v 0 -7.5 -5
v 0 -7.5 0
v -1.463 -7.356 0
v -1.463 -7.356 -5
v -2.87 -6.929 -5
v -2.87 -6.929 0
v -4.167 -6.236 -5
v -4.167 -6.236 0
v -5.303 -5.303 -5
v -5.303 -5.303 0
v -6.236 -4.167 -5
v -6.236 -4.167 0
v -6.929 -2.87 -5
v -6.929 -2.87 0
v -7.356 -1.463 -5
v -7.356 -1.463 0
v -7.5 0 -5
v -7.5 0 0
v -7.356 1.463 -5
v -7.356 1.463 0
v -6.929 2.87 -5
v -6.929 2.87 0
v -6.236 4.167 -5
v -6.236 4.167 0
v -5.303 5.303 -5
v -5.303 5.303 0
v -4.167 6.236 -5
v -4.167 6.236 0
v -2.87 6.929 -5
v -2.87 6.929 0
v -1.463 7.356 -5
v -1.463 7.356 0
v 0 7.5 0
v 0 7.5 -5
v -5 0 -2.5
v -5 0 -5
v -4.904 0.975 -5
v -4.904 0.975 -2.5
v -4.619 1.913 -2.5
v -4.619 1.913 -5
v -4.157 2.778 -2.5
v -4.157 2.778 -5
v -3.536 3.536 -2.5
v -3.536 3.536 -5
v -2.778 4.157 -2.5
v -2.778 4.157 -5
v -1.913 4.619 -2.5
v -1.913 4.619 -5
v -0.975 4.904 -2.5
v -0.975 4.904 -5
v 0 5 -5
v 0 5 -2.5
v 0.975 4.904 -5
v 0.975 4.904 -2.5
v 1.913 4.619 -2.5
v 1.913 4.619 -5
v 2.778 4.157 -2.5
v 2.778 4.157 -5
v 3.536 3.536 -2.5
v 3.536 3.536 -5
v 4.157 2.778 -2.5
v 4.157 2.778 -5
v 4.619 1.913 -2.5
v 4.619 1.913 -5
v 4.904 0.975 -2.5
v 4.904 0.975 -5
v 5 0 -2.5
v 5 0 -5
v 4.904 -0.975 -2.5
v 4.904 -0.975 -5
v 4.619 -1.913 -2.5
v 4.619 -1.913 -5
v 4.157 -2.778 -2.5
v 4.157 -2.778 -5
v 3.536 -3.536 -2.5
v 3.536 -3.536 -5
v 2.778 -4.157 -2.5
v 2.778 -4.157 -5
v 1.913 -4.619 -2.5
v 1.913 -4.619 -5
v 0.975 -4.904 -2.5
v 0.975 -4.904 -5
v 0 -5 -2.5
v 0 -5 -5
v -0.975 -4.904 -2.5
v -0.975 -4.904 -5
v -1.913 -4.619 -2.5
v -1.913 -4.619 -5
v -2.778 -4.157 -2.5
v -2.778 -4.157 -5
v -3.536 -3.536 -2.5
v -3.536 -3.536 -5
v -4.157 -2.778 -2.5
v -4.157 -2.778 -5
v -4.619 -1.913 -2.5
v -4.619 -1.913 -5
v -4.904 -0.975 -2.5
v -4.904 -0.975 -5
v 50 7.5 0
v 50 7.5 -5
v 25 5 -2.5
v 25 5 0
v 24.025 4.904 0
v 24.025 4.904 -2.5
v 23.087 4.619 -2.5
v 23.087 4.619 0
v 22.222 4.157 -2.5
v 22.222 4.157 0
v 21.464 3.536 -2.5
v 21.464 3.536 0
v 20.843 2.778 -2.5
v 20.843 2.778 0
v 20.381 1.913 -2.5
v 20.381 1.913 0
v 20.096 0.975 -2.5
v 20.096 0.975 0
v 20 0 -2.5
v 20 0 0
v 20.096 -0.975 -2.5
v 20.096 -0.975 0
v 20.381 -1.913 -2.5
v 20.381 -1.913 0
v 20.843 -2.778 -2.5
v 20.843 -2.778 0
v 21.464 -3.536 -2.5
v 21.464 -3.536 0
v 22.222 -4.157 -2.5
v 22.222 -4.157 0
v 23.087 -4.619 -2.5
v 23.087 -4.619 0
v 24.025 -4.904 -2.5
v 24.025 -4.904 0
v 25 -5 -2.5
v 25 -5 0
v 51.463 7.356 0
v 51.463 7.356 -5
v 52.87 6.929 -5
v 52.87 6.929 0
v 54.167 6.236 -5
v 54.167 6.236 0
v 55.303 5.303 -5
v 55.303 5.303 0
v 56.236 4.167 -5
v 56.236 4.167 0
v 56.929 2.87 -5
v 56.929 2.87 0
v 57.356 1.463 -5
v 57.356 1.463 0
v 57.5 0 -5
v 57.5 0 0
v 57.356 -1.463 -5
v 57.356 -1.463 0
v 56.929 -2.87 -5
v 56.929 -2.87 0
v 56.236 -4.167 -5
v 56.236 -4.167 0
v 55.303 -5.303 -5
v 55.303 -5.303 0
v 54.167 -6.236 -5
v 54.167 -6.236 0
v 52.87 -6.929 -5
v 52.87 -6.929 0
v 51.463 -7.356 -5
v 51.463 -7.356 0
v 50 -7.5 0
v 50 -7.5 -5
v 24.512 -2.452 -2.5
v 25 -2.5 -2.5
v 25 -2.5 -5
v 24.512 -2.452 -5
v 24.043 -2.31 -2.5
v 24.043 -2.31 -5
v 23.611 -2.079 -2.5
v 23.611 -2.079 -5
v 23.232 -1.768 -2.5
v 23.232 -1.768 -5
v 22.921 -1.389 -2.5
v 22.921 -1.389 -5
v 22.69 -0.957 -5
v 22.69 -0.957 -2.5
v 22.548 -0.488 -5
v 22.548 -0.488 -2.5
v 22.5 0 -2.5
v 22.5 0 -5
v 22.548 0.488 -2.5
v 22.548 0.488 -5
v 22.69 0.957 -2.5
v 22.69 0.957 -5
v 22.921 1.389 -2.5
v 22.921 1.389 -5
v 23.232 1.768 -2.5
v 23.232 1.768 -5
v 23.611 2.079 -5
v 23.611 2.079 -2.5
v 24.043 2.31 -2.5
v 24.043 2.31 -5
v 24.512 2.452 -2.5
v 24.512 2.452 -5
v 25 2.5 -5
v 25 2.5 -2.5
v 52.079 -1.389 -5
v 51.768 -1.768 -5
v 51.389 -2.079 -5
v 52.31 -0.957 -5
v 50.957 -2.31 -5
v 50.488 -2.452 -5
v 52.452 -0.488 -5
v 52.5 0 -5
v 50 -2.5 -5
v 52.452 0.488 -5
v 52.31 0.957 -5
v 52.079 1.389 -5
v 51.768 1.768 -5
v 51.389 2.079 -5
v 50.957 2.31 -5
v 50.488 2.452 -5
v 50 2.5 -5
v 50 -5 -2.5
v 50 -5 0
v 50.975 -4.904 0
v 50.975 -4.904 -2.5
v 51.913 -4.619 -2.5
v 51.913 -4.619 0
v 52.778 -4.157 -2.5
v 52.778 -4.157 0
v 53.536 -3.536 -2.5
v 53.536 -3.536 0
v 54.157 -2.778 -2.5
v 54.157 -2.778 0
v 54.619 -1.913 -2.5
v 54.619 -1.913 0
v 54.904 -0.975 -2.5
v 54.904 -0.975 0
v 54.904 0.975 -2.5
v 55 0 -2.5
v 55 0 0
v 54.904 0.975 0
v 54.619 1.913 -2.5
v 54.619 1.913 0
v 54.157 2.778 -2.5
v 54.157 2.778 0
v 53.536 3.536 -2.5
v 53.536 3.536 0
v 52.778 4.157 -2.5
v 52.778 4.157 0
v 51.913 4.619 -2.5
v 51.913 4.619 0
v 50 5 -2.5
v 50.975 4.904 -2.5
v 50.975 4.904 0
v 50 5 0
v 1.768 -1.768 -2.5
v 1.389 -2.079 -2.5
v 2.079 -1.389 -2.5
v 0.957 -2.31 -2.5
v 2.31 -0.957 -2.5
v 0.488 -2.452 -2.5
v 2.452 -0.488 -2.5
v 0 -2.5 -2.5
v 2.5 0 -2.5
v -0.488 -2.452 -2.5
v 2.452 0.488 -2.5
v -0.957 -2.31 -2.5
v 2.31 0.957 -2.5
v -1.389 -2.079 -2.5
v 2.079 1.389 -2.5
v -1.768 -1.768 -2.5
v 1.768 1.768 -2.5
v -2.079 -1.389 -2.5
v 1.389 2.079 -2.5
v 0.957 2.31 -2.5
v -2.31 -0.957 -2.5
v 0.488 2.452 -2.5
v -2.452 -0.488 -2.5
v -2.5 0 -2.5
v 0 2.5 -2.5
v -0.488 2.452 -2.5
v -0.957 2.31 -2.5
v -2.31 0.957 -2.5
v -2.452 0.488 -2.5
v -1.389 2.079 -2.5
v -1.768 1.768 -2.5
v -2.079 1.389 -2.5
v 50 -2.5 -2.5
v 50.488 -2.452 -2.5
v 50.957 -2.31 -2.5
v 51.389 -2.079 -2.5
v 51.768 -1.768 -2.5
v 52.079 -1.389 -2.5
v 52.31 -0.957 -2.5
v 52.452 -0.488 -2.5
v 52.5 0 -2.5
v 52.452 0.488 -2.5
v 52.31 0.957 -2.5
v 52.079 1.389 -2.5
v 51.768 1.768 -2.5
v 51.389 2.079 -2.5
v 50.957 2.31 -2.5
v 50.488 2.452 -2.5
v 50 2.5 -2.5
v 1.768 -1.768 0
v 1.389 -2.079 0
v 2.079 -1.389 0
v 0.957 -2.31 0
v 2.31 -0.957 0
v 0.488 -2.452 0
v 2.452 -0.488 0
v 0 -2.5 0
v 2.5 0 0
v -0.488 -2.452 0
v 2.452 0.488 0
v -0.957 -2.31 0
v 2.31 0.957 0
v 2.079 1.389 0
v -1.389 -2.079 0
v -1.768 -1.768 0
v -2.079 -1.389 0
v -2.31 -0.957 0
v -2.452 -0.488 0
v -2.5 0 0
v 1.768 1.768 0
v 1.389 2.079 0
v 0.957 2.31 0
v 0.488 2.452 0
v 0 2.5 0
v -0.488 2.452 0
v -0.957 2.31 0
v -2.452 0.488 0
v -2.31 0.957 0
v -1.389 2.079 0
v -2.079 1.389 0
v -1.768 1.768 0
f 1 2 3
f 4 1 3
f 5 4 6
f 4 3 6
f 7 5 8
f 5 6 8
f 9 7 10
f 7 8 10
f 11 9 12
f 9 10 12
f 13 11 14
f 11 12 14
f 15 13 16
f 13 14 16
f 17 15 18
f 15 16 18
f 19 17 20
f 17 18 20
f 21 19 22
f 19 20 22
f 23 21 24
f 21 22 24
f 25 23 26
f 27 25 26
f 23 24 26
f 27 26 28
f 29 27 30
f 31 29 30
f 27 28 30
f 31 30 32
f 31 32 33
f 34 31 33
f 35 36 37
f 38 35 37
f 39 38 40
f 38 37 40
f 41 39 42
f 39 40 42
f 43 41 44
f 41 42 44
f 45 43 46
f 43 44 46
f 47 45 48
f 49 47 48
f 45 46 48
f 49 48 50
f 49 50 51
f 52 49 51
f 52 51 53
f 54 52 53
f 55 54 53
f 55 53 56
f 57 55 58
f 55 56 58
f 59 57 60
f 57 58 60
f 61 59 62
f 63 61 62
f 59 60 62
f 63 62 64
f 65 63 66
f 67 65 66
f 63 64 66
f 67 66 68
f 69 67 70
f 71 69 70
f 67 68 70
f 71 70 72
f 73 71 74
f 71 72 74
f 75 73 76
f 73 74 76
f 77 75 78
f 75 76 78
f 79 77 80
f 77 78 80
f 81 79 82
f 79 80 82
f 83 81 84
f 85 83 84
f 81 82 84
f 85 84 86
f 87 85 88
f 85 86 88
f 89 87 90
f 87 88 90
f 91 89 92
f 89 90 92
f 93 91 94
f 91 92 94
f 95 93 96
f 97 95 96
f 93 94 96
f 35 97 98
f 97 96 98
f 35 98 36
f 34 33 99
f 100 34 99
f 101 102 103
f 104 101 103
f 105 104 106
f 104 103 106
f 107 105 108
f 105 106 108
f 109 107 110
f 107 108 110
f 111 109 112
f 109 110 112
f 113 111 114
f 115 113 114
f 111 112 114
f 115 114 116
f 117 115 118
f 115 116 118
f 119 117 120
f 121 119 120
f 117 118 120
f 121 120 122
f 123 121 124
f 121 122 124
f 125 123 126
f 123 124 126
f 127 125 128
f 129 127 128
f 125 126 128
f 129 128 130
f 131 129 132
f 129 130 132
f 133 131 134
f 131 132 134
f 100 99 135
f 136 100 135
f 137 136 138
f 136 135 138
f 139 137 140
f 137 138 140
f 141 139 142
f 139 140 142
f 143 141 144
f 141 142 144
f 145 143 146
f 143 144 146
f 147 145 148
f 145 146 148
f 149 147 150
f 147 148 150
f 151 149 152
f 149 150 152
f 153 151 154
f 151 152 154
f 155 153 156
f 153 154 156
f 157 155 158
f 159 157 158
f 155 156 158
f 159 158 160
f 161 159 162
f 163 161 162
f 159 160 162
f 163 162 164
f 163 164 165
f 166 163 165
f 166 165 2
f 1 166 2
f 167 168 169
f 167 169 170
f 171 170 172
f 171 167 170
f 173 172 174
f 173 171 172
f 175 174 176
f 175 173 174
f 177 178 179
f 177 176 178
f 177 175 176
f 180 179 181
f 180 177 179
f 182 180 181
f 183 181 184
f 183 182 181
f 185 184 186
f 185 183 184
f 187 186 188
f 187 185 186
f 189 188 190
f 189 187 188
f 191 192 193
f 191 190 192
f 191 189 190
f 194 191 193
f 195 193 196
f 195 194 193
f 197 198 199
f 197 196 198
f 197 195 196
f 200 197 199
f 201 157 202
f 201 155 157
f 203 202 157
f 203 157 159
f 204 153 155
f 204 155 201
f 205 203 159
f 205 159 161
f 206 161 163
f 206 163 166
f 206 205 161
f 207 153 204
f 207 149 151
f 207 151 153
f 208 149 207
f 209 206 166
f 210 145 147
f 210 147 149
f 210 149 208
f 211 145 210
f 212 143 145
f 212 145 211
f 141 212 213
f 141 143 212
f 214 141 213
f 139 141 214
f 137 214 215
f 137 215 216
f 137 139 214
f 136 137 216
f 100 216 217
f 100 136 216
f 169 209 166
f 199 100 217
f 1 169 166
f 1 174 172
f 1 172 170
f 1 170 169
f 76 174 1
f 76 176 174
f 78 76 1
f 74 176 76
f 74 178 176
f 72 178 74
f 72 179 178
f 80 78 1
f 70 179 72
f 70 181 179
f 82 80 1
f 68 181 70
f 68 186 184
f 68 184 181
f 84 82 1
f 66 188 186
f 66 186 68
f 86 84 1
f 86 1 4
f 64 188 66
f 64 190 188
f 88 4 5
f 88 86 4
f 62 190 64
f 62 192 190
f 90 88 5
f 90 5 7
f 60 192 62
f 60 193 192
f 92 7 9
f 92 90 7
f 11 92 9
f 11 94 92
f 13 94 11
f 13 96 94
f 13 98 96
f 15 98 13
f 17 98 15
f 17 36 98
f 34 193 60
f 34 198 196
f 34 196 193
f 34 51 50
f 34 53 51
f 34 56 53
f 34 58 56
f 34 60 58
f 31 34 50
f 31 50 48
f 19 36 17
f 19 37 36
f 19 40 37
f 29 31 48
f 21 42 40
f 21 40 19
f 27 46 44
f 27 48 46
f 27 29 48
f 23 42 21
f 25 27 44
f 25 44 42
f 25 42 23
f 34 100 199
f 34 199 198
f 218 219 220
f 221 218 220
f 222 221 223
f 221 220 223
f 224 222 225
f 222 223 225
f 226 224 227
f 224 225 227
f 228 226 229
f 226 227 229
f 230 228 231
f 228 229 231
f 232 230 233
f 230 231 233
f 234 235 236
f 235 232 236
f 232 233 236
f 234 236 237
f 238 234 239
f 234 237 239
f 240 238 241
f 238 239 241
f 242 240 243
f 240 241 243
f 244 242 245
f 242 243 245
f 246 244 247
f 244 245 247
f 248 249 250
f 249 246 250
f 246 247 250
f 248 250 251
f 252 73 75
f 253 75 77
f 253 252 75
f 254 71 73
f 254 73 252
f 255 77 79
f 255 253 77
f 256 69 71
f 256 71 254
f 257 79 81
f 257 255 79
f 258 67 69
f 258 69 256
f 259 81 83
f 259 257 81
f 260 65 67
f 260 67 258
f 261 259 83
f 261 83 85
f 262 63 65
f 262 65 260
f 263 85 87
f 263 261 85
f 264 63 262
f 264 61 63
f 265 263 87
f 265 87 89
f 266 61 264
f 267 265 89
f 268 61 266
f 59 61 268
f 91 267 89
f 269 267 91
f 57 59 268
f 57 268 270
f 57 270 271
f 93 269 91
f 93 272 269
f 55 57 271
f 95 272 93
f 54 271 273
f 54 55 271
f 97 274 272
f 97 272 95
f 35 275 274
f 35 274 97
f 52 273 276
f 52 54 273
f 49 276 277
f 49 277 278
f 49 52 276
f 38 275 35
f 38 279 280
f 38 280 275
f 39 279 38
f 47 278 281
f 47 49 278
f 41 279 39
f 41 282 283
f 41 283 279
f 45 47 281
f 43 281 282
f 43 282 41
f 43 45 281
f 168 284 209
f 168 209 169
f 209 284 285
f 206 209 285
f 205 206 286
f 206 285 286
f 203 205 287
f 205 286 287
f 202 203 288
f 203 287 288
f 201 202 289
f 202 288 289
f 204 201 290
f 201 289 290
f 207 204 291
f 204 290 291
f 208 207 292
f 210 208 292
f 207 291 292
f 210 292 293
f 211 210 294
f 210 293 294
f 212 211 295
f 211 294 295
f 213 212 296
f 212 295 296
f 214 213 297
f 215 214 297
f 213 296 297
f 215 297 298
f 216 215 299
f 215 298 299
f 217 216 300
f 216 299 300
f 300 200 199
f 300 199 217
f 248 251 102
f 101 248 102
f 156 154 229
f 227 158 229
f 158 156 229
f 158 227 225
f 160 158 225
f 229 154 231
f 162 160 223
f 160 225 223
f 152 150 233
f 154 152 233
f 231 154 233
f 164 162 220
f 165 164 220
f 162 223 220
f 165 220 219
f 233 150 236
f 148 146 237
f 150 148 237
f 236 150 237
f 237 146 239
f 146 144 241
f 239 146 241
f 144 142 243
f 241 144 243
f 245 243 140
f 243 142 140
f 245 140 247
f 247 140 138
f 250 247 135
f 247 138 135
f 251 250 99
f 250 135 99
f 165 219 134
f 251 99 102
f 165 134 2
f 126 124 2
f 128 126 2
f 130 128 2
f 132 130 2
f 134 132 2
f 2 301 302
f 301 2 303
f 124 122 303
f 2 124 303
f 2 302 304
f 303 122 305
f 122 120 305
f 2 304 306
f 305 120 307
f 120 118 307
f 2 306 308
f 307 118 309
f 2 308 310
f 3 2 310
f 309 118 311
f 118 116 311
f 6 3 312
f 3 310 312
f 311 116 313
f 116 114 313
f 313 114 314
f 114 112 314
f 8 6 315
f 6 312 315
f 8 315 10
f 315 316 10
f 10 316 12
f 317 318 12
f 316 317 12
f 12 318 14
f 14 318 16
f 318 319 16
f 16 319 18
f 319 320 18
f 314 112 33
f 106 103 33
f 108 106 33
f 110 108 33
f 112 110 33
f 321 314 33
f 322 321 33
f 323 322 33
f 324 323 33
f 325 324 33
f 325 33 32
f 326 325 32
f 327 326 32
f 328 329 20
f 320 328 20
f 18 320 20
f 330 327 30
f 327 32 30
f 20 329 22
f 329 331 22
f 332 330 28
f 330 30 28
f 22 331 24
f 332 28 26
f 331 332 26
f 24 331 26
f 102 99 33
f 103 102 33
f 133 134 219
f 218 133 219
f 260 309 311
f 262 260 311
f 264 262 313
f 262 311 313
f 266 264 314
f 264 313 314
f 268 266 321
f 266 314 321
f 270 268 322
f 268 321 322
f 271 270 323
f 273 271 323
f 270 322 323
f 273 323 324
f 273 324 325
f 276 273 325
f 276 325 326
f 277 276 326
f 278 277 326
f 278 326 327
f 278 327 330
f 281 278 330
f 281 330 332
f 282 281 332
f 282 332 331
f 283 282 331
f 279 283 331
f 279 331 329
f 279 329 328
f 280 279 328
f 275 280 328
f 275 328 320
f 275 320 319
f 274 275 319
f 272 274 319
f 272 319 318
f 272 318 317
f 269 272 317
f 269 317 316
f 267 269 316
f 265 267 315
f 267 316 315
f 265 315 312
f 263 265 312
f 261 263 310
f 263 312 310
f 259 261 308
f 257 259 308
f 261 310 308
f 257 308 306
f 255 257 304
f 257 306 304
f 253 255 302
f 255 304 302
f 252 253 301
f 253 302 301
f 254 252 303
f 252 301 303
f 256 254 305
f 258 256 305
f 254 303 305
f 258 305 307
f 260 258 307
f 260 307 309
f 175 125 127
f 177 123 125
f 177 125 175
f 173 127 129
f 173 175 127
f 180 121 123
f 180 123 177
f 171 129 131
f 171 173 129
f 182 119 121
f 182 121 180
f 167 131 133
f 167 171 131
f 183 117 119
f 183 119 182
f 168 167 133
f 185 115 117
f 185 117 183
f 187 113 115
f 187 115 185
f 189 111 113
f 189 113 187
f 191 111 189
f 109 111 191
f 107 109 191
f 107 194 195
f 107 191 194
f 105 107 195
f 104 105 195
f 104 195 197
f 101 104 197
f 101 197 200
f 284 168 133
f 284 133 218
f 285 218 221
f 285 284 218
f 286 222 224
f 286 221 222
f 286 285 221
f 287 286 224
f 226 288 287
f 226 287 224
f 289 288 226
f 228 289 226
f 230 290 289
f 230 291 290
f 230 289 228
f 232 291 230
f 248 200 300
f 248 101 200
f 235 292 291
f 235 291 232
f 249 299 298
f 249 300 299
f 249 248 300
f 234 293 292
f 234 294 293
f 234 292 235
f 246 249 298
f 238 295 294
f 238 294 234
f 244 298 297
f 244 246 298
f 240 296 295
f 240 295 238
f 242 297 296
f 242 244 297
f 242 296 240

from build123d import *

# Parameters (mm, degrees)
BASE_FLANGE1_DEPTH = 5
SKETCH17_R         = 5
CUT_EXTRUDE1_DEPTH = 2.5
SKETCH39_R         = 2.5
CUT_EXTRUDE2_DEPTH = 10
CUT_EXTRUDE4_DEPTH = 59.202233634
SKETCH40_R         = 5
SKETCH40_R_2       = 2.5
CUT_EXTRUDE6_DEPTH = 2.5


# Sheet-metal steps are written as plain solids
with BuildPart() as part:
    # Sketch1 → Base-Flange1 (new body)
    with BuildSketch(Plane.XY):
        with BuildLine():
            Line((0, 7.5), (50, 7.5))
            ThreePointArc((50, 7.5), (57.5, 0), (50, -7.5))
            Line((50, -7.5), (0, -7.5))
            ThreePointArc((0, -7.5), (-7.5, 0), (0, 7.5))
        make_face()
    extrude(amount=-BASE_FLANGE1_DEPTH)

    # Sketch17 → Cut-Extrude1 (cut)
    with BuildSketch(Plane(origin=(0, 0, -5), x_dir=(-1, 0, 0), z_dir=(0, 0, -1))):
        Circle(SKETCH17_R)
    extrude(amount=-CUT_EXTRUDE1_DEPTH, mode=Mode.SUBTRACT)

    # Sketch39 → Cut-Extrude2 (cut)
    with BuildSketch(Plane.XY):
        Circle(SKETCH39_R)
        with Locations((50, 0)):
            Circle(SKETCH39_R)
    extrude(amount=-CUT_EXTRUDE2_DEPTH, mode=Mode.SUBTRACT)

    # Sketch41 → Cut-Extrude4 (cut, through all)
    with BuildSketch(Plane.XY):
        with BuildLine():
            Line((25, 2.5), (50, 2.5))
            ThreePointArc((50, 2.5), (52.5, 0), (50, -2.5))
            Line((50, -2.5), (25, -2.5))
            ThreePointArc((25, -2.5), (22.5, 0), (25, 2.5))
        make_face()
    extrude(amount=-CUT_EXTRUDE4_DEPTH, mode=Mode.SUBTRACT)

    # Sketch40 → Cut-Extrude6 (cut)
    # profile 1 of 2: a face of its own
    with BuildSketch(Plane.XY):
        with Locations((50, 0)):
            Circle(SKETCH40_R)
        with Locations((50, 0)):
            Circle(SKETCH40_R_2, mode=Mode.SUBTRACT)
    # profile 2 of 2: a face of its own
    with BuildSketch(Plane.XY):
        with BuildLine():
            Line((25, -5), (50, -5))
            ThreePointArc((50, -5), (45, 0), (50, 5))
            Line((50, 5), (25, 5))
            ThreePointArc((25, 5), (20, 0), (25, -5))
        make_face()
    extrude(amount=-CUT_EXTRUDE6_DEPTH, mode=Mode.SUBTRACT)


solid = part.part
